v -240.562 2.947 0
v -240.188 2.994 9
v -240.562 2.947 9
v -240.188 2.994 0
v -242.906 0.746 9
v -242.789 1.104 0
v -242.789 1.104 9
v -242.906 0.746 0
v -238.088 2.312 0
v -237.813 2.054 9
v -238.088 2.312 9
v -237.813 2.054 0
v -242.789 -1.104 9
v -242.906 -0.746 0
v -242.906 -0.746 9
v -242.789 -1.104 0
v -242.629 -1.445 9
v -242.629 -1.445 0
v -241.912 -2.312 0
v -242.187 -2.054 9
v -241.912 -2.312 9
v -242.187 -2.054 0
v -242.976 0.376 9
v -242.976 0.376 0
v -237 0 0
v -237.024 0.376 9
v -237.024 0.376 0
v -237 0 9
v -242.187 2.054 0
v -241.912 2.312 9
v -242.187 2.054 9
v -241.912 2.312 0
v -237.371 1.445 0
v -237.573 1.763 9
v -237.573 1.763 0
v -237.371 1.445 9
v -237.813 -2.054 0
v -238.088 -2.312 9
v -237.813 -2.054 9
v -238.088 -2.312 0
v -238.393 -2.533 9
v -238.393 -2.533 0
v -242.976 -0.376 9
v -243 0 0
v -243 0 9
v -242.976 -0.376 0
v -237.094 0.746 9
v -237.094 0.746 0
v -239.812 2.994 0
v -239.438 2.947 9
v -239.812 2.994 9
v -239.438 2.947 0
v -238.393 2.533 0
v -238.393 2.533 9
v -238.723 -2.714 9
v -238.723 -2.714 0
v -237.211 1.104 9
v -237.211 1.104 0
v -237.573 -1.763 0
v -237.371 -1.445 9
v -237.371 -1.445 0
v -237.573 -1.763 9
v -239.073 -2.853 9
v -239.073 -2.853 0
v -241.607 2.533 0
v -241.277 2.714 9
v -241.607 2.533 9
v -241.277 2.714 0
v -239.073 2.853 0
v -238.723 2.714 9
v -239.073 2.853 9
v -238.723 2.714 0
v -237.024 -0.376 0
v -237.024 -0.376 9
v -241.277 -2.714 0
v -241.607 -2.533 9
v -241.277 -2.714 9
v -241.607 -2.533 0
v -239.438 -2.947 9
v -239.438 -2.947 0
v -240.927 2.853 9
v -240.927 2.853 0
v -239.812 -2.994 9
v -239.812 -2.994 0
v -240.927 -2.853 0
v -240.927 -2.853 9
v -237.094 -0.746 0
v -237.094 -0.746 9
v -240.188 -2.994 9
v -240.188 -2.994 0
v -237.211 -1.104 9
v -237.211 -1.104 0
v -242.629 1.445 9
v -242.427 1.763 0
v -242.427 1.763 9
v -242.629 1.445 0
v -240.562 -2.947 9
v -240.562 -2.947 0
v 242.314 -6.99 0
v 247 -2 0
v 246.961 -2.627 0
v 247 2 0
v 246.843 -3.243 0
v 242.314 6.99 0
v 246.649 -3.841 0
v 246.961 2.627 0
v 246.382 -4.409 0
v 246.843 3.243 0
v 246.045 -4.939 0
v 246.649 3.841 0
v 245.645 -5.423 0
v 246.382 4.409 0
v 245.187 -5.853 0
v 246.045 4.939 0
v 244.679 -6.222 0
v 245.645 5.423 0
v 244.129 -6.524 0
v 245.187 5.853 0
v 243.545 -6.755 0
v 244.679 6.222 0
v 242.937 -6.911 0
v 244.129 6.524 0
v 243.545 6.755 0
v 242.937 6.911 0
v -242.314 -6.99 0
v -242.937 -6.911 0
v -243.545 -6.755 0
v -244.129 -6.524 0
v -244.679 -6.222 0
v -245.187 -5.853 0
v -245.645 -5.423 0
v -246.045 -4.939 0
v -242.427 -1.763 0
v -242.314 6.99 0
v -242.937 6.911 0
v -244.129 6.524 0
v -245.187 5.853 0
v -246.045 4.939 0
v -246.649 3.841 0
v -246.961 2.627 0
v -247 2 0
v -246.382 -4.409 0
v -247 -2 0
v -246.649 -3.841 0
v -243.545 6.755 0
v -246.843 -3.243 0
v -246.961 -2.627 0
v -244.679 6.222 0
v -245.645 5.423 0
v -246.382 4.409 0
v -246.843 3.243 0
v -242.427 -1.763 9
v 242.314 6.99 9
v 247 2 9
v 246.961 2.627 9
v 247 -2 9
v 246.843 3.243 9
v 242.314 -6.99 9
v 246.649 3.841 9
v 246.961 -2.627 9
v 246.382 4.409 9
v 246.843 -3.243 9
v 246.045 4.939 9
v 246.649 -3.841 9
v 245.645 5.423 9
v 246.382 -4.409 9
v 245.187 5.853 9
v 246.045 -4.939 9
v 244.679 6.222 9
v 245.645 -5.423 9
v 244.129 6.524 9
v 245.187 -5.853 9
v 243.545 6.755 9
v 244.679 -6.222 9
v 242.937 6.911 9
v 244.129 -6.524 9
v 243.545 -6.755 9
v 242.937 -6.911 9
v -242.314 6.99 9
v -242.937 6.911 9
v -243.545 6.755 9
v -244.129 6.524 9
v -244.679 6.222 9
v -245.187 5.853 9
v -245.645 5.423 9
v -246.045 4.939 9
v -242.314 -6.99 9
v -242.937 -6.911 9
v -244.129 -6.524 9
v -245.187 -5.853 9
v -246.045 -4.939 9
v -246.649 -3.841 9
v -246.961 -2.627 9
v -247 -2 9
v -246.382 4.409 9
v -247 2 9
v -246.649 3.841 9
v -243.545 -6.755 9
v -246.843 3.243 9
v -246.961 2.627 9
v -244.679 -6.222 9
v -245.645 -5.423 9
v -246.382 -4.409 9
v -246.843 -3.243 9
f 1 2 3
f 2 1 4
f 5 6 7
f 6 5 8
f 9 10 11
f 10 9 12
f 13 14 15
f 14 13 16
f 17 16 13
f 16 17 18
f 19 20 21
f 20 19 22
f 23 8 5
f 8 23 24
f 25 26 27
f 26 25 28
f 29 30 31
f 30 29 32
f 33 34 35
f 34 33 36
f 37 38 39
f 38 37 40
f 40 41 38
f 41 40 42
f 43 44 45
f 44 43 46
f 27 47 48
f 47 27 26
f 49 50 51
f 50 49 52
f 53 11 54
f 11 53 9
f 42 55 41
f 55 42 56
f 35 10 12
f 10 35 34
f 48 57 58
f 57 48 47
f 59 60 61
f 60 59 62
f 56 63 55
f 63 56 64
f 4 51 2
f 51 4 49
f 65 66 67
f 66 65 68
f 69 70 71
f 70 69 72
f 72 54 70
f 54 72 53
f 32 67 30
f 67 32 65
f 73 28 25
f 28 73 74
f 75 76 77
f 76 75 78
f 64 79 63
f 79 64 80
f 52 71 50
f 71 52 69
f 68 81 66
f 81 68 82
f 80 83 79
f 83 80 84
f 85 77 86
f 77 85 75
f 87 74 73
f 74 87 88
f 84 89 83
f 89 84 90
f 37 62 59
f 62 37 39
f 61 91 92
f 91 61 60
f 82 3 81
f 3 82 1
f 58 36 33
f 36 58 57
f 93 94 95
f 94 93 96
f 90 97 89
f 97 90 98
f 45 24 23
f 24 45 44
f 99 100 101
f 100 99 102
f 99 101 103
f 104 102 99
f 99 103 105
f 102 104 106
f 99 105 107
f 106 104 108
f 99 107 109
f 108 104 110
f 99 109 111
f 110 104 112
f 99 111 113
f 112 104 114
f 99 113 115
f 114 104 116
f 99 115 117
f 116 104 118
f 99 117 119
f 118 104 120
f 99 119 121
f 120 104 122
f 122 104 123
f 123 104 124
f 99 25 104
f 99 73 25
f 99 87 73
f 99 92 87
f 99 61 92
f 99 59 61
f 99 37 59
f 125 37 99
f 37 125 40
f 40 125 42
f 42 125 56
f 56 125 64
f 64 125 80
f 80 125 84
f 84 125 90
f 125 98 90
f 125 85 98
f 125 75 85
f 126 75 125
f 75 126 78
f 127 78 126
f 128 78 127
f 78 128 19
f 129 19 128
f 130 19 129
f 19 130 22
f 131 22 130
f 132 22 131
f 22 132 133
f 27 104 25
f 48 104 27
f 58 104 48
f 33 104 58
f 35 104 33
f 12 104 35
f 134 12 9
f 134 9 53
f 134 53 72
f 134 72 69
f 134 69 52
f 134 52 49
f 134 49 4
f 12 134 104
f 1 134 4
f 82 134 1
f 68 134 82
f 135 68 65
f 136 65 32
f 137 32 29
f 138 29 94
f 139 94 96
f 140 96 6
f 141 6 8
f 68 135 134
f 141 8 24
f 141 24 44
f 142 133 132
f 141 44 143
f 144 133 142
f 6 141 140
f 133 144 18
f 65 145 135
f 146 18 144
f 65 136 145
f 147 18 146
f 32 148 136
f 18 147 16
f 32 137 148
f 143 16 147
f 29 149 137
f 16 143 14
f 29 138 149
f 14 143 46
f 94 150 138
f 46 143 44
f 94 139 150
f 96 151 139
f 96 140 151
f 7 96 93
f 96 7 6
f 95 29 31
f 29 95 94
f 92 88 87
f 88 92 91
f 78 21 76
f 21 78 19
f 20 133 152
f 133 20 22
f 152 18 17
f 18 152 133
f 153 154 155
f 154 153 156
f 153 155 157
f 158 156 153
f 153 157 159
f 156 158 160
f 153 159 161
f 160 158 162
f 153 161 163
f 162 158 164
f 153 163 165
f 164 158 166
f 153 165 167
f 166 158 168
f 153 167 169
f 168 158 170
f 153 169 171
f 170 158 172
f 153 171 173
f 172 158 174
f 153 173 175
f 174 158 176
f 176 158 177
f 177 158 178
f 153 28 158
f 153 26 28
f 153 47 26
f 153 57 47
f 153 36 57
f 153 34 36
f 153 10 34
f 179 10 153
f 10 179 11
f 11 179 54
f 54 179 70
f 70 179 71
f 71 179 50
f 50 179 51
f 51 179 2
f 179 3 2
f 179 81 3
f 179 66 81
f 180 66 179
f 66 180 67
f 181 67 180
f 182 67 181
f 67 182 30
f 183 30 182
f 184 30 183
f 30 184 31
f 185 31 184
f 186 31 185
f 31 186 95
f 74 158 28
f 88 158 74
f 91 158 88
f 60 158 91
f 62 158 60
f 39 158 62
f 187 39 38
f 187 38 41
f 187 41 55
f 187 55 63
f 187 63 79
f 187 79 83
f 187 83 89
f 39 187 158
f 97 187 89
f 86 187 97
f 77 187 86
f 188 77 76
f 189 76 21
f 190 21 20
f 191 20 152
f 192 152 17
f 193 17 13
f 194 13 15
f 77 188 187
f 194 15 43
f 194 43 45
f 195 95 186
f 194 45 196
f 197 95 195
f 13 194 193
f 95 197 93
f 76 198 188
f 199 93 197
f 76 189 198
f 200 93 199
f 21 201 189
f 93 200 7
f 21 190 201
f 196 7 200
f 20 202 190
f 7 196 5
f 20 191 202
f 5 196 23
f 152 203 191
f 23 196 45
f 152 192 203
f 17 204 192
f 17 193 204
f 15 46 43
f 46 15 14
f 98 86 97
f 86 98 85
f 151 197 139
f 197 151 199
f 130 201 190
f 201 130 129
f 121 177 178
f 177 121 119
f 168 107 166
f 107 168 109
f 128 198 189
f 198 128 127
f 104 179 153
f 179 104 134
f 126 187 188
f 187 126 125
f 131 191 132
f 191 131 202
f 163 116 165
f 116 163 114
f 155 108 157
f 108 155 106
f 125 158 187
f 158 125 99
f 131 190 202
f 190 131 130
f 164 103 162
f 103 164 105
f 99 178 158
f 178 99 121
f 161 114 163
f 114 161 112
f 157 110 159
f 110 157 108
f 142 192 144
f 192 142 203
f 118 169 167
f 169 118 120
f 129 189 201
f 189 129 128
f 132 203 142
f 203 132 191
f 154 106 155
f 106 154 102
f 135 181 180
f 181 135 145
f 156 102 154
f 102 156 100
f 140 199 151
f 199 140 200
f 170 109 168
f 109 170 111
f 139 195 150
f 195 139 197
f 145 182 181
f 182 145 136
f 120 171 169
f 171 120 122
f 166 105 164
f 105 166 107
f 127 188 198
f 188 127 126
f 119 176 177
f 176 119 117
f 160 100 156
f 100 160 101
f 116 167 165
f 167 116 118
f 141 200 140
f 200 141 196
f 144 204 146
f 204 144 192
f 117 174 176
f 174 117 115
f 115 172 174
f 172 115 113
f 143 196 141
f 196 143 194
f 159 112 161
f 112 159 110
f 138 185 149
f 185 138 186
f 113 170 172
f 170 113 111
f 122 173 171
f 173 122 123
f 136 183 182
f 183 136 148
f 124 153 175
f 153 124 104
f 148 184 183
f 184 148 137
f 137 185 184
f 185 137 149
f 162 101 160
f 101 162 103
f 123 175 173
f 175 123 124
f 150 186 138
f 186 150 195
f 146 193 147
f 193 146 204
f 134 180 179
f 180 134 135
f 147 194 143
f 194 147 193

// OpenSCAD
$fn = 50;


difference() {
	union() {
		hull() {
			translate(v = [-242.0000000000, 2.0000000000, 0]) {
				cylinder(h = 9, r = 5);
			}
			translate(v = [242.0000000000, 2.0000000000, 0]) {
				cylinder(h = 9, r = 5);
			}
			translate(v = [-242.0000000000, -2.0000000000, 0]) {
				cylinder(h = 9, r = 5);
			}
			translate(v = [242.0000000000, -2.0000000000, 0]) {
				cylinder(h = 9, r = 5);
			}
		}
	}
	union() {
		translate(v = [-240.0000000000, 0.0000000000, 0]) {
			cylinder(h = 9, r = 3.0000000000);
		}
		translate(v = [-240.0000000000, 0.0000000000, 0]) {
			cylinder(h = 9, r = 1.5000000000);
		}
		translate(v = [-240.0000000000, 0.0000000000, 0]) {
			cylinder(h = 9, r = 1.5000000000);
		}
		translate(v = [-240.0000000000, 0.0000000000, 0]) {
			cylinder(h = 9, r = 1.5000000000);
		}
	}
}
